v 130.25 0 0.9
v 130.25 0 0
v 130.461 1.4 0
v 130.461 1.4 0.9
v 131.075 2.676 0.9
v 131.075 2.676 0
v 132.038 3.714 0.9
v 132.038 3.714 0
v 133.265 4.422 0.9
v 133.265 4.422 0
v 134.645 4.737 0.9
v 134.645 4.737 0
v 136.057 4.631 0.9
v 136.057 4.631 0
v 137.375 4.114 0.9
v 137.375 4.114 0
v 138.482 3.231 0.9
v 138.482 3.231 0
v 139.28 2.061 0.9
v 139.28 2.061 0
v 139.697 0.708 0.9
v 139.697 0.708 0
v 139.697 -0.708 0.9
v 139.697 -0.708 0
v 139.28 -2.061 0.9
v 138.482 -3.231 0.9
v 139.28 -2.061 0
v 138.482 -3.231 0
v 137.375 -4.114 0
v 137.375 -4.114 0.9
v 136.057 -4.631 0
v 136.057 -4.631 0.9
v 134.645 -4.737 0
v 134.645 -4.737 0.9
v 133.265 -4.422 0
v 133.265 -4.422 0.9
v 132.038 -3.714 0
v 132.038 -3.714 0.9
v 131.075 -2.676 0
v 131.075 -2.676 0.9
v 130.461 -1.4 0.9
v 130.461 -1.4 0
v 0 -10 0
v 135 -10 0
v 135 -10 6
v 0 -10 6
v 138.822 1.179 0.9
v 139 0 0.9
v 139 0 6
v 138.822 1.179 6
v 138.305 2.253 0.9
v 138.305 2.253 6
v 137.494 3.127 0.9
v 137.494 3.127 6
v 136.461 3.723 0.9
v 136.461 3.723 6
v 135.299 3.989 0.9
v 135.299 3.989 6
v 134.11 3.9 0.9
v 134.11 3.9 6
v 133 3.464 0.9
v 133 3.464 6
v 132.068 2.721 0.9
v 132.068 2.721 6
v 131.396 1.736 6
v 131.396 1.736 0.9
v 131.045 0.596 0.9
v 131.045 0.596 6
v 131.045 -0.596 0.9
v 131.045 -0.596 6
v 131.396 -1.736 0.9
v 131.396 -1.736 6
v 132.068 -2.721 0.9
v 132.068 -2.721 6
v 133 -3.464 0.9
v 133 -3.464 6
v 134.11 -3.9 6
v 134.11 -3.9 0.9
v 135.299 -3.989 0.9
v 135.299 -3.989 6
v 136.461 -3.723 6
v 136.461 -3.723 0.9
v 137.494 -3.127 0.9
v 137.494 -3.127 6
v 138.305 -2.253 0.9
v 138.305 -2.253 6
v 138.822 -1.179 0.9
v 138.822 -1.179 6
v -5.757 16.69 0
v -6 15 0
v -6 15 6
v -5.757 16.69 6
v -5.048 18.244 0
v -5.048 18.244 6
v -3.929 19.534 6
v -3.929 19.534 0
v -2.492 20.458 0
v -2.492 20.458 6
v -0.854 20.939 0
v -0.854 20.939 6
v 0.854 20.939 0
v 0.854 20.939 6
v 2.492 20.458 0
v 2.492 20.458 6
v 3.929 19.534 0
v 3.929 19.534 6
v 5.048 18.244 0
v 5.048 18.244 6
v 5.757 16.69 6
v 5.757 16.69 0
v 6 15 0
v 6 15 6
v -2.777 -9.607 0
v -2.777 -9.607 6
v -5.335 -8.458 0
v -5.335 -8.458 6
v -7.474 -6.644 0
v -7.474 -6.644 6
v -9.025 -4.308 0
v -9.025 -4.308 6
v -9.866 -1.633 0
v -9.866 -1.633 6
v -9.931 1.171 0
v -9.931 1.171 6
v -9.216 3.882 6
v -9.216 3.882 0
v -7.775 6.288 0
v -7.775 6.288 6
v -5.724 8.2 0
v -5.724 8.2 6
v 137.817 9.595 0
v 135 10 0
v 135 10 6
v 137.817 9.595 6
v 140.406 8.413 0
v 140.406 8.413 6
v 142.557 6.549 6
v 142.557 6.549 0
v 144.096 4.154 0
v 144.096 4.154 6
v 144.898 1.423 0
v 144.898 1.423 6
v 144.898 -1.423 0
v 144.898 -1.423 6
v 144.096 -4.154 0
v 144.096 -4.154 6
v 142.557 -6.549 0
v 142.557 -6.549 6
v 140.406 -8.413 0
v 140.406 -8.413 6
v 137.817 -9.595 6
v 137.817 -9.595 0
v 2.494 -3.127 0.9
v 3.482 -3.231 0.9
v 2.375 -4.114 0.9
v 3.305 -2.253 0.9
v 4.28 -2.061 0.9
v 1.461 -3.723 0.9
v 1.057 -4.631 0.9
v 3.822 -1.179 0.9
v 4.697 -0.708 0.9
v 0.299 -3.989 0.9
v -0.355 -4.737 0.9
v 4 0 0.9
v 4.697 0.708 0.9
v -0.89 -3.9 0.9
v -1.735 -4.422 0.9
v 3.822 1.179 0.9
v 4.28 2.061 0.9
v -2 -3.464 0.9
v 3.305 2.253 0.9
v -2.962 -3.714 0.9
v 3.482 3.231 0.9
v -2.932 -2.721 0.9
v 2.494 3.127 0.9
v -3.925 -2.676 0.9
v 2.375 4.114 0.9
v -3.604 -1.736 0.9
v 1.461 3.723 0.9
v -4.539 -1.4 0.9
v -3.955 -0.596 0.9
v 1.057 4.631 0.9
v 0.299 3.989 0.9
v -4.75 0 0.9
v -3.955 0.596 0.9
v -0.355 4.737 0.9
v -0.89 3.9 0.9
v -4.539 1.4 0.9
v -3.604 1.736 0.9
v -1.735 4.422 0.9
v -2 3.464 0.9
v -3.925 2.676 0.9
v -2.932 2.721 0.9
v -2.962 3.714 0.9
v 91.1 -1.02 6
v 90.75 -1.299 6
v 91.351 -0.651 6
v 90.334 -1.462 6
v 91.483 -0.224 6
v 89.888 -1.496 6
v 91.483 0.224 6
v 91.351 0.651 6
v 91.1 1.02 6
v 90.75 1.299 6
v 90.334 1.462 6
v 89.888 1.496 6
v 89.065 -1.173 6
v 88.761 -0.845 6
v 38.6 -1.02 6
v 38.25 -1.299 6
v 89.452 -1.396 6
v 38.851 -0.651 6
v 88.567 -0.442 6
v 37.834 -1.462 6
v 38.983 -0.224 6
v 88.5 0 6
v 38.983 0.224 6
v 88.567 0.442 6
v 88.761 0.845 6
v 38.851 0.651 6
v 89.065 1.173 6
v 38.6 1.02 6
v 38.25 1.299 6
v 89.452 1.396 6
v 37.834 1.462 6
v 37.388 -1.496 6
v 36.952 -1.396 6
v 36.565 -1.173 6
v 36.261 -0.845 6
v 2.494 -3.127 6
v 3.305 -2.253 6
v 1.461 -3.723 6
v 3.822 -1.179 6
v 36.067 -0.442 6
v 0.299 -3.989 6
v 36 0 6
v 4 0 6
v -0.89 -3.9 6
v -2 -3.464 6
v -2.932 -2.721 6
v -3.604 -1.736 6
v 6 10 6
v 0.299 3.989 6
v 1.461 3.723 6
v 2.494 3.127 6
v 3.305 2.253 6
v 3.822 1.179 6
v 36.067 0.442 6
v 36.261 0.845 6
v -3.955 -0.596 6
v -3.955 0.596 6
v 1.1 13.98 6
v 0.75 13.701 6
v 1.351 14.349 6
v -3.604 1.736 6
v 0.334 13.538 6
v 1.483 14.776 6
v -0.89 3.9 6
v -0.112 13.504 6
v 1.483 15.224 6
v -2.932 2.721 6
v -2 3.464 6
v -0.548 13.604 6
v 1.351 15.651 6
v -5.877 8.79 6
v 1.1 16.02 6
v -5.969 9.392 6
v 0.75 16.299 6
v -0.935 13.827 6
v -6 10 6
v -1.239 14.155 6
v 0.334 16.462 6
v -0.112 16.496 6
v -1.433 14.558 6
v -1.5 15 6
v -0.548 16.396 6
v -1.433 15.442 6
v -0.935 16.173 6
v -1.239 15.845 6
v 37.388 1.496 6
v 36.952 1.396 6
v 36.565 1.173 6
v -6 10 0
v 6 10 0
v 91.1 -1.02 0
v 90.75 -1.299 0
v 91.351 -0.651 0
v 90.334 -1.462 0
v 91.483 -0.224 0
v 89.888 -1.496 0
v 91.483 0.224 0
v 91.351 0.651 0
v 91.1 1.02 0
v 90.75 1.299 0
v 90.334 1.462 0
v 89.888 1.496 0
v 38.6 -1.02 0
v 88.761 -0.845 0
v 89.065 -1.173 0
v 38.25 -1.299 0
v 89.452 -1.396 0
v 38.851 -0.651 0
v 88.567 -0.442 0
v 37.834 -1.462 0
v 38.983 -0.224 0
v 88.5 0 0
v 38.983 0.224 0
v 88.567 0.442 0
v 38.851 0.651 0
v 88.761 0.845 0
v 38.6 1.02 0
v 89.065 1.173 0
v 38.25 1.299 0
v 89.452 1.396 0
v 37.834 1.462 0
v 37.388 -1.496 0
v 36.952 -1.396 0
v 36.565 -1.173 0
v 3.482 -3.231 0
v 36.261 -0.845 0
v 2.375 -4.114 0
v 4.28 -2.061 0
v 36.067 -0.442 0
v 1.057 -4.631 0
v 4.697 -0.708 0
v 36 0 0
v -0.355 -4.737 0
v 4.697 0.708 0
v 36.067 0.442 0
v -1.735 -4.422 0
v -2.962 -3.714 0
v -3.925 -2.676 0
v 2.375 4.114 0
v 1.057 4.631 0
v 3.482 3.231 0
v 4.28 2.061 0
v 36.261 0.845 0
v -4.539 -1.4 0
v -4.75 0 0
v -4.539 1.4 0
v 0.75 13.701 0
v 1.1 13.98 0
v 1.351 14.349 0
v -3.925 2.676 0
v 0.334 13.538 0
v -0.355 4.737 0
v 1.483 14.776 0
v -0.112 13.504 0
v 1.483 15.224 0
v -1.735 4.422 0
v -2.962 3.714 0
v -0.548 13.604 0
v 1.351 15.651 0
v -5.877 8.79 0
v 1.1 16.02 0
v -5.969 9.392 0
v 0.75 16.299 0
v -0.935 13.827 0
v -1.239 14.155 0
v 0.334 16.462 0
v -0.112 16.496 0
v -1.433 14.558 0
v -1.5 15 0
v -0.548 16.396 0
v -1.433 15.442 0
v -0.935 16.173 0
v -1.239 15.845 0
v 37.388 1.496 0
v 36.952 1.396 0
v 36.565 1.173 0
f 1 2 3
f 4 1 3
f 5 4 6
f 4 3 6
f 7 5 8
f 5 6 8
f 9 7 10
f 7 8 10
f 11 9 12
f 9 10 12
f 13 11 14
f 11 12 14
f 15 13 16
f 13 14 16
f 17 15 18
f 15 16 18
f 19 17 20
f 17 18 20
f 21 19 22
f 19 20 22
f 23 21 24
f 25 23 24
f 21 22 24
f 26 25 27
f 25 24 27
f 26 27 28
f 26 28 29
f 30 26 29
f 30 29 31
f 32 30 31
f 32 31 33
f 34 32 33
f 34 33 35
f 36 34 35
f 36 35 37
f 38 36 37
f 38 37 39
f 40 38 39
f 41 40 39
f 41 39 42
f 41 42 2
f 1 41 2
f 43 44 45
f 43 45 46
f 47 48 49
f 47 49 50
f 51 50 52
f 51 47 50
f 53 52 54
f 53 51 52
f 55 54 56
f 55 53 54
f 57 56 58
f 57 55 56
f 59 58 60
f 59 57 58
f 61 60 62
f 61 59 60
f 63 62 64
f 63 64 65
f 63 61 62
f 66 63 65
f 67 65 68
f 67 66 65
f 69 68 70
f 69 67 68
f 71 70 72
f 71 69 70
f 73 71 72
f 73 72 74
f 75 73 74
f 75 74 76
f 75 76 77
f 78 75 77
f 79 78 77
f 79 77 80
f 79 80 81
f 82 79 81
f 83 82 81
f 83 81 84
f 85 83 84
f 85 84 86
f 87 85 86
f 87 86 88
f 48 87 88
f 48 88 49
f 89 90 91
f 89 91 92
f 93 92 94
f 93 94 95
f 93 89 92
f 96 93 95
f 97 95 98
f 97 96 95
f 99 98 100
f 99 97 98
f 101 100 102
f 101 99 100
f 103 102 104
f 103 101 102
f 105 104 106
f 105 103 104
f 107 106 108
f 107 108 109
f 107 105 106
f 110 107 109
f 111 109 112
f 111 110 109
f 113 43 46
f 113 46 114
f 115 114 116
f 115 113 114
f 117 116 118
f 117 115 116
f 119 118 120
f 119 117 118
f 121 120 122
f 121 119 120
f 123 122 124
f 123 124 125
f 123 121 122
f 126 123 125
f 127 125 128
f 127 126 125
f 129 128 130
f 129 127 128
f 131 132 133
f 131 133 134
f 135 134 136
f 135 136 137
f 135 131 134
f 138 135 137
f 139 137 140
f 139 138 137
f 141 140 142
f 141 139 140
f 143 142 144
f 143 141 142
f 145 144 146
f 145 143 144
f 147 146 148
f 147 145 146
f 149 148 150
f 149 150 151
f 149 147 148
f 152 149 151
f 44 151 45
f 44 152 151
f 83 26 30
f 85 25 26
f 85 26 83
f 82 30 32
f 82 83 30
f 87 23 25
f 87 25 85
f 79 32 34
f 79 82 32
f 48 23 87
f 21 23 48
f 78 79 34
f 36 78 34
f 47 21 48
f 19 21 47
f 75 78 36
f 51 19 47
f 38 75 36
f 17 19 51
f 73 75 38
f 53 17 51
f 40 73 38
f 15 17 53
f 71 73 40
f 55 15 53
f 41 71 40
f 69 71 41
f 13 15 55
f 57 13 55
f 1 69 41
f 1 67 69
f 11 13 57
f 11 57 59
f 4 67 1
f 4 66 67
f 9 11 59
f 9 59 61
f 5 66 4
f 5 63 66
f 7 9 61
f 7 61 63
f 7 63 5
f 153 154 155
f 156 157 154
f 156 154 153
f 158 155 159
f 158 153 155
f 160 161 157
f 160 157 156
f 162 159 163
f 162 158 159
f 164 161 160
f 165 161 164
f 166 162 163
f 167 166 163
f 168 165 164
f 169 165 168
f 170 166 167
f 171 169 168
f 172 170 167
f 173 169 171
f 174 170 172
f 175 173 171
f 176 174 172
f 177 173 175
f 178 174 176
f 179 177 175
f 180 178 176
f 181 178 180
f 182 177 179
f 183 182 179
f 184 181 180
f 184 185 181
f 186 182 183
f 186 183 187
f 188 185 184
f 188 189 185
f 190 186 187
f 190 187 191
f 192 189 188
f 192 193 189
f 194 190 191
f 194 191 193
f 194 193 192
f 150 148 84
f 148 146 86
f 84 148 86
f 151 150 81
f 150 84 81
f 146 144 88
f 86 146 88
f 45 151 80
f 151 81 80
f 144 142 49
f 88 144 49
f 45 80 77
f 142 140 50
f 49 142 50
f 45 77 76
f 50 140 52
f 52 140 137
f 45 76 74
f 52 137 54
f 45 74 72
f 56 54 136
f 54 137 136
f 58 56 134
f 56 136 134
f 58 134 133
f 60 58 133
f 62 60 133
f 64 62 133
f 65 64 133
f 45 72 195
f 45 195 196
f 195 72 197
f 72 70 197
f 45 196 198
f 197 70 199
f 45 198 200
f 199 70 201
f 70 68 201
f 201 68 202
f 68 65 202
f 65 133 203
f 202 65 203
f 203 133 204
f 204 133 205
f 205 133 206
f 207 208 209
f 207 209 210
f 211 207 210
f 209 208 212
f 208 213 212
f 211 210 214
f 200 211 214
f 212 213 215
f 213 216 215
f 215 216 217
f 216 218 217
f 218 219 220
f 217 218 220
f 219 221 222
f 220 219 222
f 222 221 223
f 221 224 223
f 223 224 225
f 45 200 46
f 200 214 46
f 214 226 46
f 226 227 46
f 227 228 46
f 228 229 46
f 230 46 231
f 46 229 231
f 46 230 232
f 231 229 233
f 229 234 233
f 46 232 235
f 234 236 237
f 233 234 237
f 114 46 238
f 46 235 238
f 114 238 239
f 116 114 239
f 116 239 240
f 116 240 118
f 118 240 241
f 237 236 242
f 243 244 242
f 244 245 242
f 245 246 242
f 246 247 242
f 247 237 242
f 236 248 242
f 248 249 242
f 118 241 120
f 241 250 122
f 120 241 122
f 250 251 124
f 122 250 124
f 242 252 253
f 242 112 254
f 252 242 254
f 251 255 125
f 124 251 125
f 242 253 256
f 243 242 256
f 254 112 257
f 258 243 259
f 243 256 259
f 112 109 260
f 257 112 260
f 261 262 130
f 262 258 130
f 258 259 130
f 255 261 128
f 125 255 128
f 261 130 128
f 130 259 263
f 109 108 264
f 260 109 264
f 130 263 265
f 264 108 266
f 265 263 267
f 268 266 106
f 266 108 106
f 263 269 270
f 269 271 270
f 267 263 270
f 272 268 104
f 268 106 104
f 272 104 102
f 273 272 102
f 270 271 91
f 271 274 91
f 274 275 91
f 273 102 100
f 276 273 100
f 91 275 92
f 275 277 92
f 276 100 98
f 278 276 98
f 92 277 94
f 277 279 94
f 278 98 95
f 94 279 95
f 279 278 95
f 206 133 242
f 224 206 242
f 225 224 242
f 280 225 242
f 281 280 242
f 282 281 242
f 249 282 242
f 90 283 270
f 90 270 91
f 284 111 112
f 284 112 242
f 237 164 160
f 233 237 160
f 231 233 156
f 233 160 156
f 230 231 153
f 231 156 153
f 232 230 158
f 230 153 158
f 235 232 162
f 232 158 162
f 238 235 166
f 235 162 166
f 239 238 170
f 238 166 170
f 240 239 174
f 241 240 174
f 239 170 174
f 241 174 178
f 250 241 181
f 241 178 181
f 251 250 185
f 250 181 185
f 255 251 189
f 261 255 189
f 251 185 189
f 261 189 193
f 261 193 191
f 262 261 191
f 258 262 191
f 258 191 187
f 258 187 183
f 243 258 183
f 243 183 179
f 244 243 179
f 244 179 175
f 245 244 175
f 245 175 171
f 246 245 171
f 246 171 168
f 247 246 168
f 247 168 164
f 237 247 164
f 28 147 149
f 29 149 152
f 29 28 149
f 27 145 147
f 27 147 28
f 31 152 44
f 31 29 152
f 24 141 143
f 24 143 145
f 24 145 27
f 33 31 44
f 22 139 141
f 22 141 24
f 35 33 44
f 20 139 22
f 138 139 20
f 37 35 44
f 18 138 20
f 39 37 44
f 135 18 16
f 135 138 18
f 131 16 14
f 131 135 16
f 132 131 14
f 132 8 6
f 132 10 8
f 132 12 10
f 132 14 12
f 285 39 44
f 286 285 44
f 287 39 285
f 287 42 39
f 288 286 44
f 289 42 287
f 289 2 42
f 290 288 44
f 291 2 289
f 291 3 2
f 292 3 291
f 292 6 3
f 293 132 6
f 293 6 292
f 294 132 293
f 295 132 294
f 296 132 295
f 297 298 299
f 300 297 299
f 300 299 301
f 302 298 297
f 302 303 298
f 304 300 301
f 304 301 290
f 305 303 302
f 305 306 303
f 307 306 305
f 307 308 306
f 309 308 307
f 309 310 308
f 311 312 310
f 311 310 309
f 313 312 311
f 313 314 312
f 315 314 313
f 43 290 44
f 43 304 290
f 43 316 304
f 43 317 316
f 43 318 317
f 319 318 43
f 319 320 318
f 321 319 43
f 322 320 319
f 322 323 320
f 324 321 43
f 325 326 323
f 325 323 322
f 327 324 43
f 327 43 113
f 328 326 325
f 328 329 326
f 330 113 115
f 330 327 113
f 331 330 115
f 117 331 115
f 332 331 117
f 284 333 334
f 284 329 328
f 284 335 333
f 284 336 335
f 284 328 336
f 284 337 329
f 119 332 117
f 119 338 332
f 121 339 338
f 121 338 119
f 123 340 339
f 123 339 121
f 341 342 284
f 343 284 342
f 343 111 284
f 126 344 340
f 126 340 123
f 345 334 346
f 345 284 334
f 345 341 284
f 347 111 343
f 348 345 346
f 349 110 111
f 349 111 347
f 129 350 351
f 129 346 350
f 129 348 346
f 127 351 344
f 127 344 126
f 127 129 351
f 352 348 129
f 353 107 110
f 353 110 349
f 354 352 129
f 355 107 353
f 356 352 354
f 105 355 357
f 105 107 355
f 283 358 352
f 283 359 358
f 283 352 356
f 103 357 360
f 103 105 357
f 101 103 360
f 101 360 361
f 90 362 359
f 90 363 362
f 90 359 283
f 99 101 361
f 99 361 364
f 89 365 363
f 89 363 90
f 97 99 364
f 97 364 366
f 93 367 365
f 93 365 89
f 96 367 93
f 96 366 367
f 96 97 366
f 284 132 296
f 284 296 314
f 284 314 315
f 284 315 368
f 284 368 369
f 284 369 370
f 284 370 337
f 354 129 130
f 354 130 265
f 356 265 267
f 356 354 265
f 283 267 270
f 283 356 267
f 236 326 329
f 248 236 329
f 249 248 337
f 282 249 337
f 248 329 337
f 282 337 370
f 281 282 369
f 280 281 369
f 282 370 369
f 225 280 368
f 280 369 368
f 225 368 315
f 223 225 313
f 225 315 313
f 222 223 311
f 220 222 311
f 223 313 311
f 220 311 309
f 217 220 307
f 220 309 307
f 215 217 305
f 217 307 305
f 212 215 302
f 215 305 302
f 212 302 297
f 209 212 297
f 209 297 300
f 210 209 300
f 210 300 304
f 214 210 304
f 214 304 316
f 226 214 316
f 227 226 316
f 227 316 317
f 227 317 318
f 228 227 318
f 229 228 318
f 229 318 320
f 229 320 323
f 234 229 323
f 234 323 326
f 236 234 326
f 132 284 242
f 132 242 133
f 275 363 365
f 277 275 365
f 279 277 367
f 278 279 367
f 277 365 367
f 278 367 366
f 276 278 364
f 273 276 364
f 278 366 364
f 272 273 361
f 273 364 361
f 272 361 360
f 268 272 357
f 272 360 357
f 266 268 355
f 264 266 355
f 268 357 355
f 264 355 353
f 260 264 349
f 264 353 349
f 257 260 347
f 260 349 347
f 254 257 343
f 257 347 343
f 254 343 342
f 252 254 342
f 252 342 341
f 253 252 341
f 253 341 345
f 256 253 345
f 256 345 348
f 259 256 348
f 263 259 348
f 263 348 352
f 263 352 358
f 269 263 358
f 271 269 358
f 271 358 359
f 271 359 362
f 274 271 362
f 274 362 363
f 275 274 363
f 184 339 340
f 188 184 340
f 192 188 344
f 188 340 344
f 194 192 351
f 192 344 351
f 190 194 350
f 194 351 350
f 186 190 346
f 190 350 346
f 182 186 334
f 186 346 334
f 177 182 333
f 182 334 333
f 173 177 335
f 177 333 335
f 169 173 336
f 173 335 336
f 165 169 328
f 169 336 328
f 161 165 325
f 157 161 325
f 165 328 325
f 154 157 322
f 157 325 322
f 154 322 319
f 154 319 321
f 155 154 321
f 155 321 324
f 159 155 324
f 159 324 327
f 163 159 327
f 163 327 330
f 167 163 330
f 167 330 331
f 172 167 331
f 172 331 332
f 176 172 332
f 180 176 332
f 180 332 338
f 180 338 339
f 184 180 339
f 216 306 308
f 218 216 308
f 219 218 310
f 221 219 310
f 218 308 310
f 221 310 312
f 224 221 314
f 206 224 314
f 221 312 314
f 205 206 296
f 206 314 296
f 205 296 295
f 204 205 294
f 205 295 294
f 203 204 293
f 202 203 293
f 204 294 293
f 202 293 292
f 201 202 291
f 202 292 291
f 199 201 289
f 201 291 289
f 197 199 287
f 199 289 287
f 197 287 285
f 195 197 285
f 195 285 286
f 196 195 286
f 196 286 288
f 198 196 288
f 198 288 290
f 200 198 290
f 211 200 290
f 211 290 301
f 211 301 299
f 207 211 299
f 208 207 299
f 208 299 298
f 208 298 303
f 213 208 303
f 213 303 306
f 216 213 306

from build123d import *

# Parameters (mm, degrees)
SKETCH_1_R                   = 4
EXTRUDE_1_DEPTH              = 6
HOLE_WIZARD_M5_1_D           = 8
HOLE_WIZARD_M5_1_CBORE_D     = 9.5
HOLE_WIZARD_M5_1_CBORE_DEPTH = 0.9
SKETCH_7_R                   = 1.5
CUT_EXTRUDE_1_DEPTH          = 1
CUT_EXTRUDE_1_DEPTH_BACK     = 7


with BuildPart() as part:
    # 草图1 → 凸台-拉伸1 (new body)
    with BuildSketch(Plane.XY):
        with BuildLine():
            Line((0, 10), (135, 10))
            ThreePointArc((135, 10), (145, 0), (135, -10))
            Line((135, -10), (0, -10))
            ThreePointArc((0, -10), (-10, 0), (0, 10))
        make_face()
        with Locations((135, 0)):
            Circle(SKETCH_1_R, mode=Mode.SUBTRACT)
        Circle(SKETCH_1_R, mode=Mode.SUBTRACT)
        with BuildLine():
            Line((-6, 10), (-6, 15))
            ThreePointArc((-6, 15), (0, 21), (6, 15))
            Line((6, 15), (6, 10))
            ThreePointArc((6, 10), (0, 4), (-6, 10))
        make_face()
    extrude(amount=EXTRUDE_1_DEPTH)

    # M5 六角头螺栓的柱形沉头孔1 (through all)
    with Locations(Plane(origin=(0, 0, 0), x_dir=(-1, 0, 0), z_dir=(0, 0, -1))):
        with Locations((-135, 0), (0, 0)):
            CounterBoreHole(HOLE_WIZARD_M5_1_D / 2, HOLE_WIZARD_M5_1_CBORE_D / 2, HOLE_WIZARD_M5_1_CBORE_DEPTH)

    # 草图7 → 切除-拉伸1 (cut, two sides)
    with BuildSketch(Plane(origin=(0, 0, 0), x_dir=(-1, 0, 0), z_dir=(0, 0, -1))) as cut_extrude_1_sk:
        with Locations((-37.5, 0)):
            Circle(SKETCH_7_R)
        with Locations((-90, 0)):
            Circle(SKETCH_7_R)
        with Locations((0, 15)):
            Circle(SKETCH_7_R)
    extrude(amount=CUT_EXTRUDE_1_DEPTH, mode=Mode.SUBTRACT)
    extrude(cut_extrude_1_sk.sketch, amount=-CUT_EXTRUDE_1_DEPTH_BACK, mode=Mode.SUBTRACT)


solid = part.part
